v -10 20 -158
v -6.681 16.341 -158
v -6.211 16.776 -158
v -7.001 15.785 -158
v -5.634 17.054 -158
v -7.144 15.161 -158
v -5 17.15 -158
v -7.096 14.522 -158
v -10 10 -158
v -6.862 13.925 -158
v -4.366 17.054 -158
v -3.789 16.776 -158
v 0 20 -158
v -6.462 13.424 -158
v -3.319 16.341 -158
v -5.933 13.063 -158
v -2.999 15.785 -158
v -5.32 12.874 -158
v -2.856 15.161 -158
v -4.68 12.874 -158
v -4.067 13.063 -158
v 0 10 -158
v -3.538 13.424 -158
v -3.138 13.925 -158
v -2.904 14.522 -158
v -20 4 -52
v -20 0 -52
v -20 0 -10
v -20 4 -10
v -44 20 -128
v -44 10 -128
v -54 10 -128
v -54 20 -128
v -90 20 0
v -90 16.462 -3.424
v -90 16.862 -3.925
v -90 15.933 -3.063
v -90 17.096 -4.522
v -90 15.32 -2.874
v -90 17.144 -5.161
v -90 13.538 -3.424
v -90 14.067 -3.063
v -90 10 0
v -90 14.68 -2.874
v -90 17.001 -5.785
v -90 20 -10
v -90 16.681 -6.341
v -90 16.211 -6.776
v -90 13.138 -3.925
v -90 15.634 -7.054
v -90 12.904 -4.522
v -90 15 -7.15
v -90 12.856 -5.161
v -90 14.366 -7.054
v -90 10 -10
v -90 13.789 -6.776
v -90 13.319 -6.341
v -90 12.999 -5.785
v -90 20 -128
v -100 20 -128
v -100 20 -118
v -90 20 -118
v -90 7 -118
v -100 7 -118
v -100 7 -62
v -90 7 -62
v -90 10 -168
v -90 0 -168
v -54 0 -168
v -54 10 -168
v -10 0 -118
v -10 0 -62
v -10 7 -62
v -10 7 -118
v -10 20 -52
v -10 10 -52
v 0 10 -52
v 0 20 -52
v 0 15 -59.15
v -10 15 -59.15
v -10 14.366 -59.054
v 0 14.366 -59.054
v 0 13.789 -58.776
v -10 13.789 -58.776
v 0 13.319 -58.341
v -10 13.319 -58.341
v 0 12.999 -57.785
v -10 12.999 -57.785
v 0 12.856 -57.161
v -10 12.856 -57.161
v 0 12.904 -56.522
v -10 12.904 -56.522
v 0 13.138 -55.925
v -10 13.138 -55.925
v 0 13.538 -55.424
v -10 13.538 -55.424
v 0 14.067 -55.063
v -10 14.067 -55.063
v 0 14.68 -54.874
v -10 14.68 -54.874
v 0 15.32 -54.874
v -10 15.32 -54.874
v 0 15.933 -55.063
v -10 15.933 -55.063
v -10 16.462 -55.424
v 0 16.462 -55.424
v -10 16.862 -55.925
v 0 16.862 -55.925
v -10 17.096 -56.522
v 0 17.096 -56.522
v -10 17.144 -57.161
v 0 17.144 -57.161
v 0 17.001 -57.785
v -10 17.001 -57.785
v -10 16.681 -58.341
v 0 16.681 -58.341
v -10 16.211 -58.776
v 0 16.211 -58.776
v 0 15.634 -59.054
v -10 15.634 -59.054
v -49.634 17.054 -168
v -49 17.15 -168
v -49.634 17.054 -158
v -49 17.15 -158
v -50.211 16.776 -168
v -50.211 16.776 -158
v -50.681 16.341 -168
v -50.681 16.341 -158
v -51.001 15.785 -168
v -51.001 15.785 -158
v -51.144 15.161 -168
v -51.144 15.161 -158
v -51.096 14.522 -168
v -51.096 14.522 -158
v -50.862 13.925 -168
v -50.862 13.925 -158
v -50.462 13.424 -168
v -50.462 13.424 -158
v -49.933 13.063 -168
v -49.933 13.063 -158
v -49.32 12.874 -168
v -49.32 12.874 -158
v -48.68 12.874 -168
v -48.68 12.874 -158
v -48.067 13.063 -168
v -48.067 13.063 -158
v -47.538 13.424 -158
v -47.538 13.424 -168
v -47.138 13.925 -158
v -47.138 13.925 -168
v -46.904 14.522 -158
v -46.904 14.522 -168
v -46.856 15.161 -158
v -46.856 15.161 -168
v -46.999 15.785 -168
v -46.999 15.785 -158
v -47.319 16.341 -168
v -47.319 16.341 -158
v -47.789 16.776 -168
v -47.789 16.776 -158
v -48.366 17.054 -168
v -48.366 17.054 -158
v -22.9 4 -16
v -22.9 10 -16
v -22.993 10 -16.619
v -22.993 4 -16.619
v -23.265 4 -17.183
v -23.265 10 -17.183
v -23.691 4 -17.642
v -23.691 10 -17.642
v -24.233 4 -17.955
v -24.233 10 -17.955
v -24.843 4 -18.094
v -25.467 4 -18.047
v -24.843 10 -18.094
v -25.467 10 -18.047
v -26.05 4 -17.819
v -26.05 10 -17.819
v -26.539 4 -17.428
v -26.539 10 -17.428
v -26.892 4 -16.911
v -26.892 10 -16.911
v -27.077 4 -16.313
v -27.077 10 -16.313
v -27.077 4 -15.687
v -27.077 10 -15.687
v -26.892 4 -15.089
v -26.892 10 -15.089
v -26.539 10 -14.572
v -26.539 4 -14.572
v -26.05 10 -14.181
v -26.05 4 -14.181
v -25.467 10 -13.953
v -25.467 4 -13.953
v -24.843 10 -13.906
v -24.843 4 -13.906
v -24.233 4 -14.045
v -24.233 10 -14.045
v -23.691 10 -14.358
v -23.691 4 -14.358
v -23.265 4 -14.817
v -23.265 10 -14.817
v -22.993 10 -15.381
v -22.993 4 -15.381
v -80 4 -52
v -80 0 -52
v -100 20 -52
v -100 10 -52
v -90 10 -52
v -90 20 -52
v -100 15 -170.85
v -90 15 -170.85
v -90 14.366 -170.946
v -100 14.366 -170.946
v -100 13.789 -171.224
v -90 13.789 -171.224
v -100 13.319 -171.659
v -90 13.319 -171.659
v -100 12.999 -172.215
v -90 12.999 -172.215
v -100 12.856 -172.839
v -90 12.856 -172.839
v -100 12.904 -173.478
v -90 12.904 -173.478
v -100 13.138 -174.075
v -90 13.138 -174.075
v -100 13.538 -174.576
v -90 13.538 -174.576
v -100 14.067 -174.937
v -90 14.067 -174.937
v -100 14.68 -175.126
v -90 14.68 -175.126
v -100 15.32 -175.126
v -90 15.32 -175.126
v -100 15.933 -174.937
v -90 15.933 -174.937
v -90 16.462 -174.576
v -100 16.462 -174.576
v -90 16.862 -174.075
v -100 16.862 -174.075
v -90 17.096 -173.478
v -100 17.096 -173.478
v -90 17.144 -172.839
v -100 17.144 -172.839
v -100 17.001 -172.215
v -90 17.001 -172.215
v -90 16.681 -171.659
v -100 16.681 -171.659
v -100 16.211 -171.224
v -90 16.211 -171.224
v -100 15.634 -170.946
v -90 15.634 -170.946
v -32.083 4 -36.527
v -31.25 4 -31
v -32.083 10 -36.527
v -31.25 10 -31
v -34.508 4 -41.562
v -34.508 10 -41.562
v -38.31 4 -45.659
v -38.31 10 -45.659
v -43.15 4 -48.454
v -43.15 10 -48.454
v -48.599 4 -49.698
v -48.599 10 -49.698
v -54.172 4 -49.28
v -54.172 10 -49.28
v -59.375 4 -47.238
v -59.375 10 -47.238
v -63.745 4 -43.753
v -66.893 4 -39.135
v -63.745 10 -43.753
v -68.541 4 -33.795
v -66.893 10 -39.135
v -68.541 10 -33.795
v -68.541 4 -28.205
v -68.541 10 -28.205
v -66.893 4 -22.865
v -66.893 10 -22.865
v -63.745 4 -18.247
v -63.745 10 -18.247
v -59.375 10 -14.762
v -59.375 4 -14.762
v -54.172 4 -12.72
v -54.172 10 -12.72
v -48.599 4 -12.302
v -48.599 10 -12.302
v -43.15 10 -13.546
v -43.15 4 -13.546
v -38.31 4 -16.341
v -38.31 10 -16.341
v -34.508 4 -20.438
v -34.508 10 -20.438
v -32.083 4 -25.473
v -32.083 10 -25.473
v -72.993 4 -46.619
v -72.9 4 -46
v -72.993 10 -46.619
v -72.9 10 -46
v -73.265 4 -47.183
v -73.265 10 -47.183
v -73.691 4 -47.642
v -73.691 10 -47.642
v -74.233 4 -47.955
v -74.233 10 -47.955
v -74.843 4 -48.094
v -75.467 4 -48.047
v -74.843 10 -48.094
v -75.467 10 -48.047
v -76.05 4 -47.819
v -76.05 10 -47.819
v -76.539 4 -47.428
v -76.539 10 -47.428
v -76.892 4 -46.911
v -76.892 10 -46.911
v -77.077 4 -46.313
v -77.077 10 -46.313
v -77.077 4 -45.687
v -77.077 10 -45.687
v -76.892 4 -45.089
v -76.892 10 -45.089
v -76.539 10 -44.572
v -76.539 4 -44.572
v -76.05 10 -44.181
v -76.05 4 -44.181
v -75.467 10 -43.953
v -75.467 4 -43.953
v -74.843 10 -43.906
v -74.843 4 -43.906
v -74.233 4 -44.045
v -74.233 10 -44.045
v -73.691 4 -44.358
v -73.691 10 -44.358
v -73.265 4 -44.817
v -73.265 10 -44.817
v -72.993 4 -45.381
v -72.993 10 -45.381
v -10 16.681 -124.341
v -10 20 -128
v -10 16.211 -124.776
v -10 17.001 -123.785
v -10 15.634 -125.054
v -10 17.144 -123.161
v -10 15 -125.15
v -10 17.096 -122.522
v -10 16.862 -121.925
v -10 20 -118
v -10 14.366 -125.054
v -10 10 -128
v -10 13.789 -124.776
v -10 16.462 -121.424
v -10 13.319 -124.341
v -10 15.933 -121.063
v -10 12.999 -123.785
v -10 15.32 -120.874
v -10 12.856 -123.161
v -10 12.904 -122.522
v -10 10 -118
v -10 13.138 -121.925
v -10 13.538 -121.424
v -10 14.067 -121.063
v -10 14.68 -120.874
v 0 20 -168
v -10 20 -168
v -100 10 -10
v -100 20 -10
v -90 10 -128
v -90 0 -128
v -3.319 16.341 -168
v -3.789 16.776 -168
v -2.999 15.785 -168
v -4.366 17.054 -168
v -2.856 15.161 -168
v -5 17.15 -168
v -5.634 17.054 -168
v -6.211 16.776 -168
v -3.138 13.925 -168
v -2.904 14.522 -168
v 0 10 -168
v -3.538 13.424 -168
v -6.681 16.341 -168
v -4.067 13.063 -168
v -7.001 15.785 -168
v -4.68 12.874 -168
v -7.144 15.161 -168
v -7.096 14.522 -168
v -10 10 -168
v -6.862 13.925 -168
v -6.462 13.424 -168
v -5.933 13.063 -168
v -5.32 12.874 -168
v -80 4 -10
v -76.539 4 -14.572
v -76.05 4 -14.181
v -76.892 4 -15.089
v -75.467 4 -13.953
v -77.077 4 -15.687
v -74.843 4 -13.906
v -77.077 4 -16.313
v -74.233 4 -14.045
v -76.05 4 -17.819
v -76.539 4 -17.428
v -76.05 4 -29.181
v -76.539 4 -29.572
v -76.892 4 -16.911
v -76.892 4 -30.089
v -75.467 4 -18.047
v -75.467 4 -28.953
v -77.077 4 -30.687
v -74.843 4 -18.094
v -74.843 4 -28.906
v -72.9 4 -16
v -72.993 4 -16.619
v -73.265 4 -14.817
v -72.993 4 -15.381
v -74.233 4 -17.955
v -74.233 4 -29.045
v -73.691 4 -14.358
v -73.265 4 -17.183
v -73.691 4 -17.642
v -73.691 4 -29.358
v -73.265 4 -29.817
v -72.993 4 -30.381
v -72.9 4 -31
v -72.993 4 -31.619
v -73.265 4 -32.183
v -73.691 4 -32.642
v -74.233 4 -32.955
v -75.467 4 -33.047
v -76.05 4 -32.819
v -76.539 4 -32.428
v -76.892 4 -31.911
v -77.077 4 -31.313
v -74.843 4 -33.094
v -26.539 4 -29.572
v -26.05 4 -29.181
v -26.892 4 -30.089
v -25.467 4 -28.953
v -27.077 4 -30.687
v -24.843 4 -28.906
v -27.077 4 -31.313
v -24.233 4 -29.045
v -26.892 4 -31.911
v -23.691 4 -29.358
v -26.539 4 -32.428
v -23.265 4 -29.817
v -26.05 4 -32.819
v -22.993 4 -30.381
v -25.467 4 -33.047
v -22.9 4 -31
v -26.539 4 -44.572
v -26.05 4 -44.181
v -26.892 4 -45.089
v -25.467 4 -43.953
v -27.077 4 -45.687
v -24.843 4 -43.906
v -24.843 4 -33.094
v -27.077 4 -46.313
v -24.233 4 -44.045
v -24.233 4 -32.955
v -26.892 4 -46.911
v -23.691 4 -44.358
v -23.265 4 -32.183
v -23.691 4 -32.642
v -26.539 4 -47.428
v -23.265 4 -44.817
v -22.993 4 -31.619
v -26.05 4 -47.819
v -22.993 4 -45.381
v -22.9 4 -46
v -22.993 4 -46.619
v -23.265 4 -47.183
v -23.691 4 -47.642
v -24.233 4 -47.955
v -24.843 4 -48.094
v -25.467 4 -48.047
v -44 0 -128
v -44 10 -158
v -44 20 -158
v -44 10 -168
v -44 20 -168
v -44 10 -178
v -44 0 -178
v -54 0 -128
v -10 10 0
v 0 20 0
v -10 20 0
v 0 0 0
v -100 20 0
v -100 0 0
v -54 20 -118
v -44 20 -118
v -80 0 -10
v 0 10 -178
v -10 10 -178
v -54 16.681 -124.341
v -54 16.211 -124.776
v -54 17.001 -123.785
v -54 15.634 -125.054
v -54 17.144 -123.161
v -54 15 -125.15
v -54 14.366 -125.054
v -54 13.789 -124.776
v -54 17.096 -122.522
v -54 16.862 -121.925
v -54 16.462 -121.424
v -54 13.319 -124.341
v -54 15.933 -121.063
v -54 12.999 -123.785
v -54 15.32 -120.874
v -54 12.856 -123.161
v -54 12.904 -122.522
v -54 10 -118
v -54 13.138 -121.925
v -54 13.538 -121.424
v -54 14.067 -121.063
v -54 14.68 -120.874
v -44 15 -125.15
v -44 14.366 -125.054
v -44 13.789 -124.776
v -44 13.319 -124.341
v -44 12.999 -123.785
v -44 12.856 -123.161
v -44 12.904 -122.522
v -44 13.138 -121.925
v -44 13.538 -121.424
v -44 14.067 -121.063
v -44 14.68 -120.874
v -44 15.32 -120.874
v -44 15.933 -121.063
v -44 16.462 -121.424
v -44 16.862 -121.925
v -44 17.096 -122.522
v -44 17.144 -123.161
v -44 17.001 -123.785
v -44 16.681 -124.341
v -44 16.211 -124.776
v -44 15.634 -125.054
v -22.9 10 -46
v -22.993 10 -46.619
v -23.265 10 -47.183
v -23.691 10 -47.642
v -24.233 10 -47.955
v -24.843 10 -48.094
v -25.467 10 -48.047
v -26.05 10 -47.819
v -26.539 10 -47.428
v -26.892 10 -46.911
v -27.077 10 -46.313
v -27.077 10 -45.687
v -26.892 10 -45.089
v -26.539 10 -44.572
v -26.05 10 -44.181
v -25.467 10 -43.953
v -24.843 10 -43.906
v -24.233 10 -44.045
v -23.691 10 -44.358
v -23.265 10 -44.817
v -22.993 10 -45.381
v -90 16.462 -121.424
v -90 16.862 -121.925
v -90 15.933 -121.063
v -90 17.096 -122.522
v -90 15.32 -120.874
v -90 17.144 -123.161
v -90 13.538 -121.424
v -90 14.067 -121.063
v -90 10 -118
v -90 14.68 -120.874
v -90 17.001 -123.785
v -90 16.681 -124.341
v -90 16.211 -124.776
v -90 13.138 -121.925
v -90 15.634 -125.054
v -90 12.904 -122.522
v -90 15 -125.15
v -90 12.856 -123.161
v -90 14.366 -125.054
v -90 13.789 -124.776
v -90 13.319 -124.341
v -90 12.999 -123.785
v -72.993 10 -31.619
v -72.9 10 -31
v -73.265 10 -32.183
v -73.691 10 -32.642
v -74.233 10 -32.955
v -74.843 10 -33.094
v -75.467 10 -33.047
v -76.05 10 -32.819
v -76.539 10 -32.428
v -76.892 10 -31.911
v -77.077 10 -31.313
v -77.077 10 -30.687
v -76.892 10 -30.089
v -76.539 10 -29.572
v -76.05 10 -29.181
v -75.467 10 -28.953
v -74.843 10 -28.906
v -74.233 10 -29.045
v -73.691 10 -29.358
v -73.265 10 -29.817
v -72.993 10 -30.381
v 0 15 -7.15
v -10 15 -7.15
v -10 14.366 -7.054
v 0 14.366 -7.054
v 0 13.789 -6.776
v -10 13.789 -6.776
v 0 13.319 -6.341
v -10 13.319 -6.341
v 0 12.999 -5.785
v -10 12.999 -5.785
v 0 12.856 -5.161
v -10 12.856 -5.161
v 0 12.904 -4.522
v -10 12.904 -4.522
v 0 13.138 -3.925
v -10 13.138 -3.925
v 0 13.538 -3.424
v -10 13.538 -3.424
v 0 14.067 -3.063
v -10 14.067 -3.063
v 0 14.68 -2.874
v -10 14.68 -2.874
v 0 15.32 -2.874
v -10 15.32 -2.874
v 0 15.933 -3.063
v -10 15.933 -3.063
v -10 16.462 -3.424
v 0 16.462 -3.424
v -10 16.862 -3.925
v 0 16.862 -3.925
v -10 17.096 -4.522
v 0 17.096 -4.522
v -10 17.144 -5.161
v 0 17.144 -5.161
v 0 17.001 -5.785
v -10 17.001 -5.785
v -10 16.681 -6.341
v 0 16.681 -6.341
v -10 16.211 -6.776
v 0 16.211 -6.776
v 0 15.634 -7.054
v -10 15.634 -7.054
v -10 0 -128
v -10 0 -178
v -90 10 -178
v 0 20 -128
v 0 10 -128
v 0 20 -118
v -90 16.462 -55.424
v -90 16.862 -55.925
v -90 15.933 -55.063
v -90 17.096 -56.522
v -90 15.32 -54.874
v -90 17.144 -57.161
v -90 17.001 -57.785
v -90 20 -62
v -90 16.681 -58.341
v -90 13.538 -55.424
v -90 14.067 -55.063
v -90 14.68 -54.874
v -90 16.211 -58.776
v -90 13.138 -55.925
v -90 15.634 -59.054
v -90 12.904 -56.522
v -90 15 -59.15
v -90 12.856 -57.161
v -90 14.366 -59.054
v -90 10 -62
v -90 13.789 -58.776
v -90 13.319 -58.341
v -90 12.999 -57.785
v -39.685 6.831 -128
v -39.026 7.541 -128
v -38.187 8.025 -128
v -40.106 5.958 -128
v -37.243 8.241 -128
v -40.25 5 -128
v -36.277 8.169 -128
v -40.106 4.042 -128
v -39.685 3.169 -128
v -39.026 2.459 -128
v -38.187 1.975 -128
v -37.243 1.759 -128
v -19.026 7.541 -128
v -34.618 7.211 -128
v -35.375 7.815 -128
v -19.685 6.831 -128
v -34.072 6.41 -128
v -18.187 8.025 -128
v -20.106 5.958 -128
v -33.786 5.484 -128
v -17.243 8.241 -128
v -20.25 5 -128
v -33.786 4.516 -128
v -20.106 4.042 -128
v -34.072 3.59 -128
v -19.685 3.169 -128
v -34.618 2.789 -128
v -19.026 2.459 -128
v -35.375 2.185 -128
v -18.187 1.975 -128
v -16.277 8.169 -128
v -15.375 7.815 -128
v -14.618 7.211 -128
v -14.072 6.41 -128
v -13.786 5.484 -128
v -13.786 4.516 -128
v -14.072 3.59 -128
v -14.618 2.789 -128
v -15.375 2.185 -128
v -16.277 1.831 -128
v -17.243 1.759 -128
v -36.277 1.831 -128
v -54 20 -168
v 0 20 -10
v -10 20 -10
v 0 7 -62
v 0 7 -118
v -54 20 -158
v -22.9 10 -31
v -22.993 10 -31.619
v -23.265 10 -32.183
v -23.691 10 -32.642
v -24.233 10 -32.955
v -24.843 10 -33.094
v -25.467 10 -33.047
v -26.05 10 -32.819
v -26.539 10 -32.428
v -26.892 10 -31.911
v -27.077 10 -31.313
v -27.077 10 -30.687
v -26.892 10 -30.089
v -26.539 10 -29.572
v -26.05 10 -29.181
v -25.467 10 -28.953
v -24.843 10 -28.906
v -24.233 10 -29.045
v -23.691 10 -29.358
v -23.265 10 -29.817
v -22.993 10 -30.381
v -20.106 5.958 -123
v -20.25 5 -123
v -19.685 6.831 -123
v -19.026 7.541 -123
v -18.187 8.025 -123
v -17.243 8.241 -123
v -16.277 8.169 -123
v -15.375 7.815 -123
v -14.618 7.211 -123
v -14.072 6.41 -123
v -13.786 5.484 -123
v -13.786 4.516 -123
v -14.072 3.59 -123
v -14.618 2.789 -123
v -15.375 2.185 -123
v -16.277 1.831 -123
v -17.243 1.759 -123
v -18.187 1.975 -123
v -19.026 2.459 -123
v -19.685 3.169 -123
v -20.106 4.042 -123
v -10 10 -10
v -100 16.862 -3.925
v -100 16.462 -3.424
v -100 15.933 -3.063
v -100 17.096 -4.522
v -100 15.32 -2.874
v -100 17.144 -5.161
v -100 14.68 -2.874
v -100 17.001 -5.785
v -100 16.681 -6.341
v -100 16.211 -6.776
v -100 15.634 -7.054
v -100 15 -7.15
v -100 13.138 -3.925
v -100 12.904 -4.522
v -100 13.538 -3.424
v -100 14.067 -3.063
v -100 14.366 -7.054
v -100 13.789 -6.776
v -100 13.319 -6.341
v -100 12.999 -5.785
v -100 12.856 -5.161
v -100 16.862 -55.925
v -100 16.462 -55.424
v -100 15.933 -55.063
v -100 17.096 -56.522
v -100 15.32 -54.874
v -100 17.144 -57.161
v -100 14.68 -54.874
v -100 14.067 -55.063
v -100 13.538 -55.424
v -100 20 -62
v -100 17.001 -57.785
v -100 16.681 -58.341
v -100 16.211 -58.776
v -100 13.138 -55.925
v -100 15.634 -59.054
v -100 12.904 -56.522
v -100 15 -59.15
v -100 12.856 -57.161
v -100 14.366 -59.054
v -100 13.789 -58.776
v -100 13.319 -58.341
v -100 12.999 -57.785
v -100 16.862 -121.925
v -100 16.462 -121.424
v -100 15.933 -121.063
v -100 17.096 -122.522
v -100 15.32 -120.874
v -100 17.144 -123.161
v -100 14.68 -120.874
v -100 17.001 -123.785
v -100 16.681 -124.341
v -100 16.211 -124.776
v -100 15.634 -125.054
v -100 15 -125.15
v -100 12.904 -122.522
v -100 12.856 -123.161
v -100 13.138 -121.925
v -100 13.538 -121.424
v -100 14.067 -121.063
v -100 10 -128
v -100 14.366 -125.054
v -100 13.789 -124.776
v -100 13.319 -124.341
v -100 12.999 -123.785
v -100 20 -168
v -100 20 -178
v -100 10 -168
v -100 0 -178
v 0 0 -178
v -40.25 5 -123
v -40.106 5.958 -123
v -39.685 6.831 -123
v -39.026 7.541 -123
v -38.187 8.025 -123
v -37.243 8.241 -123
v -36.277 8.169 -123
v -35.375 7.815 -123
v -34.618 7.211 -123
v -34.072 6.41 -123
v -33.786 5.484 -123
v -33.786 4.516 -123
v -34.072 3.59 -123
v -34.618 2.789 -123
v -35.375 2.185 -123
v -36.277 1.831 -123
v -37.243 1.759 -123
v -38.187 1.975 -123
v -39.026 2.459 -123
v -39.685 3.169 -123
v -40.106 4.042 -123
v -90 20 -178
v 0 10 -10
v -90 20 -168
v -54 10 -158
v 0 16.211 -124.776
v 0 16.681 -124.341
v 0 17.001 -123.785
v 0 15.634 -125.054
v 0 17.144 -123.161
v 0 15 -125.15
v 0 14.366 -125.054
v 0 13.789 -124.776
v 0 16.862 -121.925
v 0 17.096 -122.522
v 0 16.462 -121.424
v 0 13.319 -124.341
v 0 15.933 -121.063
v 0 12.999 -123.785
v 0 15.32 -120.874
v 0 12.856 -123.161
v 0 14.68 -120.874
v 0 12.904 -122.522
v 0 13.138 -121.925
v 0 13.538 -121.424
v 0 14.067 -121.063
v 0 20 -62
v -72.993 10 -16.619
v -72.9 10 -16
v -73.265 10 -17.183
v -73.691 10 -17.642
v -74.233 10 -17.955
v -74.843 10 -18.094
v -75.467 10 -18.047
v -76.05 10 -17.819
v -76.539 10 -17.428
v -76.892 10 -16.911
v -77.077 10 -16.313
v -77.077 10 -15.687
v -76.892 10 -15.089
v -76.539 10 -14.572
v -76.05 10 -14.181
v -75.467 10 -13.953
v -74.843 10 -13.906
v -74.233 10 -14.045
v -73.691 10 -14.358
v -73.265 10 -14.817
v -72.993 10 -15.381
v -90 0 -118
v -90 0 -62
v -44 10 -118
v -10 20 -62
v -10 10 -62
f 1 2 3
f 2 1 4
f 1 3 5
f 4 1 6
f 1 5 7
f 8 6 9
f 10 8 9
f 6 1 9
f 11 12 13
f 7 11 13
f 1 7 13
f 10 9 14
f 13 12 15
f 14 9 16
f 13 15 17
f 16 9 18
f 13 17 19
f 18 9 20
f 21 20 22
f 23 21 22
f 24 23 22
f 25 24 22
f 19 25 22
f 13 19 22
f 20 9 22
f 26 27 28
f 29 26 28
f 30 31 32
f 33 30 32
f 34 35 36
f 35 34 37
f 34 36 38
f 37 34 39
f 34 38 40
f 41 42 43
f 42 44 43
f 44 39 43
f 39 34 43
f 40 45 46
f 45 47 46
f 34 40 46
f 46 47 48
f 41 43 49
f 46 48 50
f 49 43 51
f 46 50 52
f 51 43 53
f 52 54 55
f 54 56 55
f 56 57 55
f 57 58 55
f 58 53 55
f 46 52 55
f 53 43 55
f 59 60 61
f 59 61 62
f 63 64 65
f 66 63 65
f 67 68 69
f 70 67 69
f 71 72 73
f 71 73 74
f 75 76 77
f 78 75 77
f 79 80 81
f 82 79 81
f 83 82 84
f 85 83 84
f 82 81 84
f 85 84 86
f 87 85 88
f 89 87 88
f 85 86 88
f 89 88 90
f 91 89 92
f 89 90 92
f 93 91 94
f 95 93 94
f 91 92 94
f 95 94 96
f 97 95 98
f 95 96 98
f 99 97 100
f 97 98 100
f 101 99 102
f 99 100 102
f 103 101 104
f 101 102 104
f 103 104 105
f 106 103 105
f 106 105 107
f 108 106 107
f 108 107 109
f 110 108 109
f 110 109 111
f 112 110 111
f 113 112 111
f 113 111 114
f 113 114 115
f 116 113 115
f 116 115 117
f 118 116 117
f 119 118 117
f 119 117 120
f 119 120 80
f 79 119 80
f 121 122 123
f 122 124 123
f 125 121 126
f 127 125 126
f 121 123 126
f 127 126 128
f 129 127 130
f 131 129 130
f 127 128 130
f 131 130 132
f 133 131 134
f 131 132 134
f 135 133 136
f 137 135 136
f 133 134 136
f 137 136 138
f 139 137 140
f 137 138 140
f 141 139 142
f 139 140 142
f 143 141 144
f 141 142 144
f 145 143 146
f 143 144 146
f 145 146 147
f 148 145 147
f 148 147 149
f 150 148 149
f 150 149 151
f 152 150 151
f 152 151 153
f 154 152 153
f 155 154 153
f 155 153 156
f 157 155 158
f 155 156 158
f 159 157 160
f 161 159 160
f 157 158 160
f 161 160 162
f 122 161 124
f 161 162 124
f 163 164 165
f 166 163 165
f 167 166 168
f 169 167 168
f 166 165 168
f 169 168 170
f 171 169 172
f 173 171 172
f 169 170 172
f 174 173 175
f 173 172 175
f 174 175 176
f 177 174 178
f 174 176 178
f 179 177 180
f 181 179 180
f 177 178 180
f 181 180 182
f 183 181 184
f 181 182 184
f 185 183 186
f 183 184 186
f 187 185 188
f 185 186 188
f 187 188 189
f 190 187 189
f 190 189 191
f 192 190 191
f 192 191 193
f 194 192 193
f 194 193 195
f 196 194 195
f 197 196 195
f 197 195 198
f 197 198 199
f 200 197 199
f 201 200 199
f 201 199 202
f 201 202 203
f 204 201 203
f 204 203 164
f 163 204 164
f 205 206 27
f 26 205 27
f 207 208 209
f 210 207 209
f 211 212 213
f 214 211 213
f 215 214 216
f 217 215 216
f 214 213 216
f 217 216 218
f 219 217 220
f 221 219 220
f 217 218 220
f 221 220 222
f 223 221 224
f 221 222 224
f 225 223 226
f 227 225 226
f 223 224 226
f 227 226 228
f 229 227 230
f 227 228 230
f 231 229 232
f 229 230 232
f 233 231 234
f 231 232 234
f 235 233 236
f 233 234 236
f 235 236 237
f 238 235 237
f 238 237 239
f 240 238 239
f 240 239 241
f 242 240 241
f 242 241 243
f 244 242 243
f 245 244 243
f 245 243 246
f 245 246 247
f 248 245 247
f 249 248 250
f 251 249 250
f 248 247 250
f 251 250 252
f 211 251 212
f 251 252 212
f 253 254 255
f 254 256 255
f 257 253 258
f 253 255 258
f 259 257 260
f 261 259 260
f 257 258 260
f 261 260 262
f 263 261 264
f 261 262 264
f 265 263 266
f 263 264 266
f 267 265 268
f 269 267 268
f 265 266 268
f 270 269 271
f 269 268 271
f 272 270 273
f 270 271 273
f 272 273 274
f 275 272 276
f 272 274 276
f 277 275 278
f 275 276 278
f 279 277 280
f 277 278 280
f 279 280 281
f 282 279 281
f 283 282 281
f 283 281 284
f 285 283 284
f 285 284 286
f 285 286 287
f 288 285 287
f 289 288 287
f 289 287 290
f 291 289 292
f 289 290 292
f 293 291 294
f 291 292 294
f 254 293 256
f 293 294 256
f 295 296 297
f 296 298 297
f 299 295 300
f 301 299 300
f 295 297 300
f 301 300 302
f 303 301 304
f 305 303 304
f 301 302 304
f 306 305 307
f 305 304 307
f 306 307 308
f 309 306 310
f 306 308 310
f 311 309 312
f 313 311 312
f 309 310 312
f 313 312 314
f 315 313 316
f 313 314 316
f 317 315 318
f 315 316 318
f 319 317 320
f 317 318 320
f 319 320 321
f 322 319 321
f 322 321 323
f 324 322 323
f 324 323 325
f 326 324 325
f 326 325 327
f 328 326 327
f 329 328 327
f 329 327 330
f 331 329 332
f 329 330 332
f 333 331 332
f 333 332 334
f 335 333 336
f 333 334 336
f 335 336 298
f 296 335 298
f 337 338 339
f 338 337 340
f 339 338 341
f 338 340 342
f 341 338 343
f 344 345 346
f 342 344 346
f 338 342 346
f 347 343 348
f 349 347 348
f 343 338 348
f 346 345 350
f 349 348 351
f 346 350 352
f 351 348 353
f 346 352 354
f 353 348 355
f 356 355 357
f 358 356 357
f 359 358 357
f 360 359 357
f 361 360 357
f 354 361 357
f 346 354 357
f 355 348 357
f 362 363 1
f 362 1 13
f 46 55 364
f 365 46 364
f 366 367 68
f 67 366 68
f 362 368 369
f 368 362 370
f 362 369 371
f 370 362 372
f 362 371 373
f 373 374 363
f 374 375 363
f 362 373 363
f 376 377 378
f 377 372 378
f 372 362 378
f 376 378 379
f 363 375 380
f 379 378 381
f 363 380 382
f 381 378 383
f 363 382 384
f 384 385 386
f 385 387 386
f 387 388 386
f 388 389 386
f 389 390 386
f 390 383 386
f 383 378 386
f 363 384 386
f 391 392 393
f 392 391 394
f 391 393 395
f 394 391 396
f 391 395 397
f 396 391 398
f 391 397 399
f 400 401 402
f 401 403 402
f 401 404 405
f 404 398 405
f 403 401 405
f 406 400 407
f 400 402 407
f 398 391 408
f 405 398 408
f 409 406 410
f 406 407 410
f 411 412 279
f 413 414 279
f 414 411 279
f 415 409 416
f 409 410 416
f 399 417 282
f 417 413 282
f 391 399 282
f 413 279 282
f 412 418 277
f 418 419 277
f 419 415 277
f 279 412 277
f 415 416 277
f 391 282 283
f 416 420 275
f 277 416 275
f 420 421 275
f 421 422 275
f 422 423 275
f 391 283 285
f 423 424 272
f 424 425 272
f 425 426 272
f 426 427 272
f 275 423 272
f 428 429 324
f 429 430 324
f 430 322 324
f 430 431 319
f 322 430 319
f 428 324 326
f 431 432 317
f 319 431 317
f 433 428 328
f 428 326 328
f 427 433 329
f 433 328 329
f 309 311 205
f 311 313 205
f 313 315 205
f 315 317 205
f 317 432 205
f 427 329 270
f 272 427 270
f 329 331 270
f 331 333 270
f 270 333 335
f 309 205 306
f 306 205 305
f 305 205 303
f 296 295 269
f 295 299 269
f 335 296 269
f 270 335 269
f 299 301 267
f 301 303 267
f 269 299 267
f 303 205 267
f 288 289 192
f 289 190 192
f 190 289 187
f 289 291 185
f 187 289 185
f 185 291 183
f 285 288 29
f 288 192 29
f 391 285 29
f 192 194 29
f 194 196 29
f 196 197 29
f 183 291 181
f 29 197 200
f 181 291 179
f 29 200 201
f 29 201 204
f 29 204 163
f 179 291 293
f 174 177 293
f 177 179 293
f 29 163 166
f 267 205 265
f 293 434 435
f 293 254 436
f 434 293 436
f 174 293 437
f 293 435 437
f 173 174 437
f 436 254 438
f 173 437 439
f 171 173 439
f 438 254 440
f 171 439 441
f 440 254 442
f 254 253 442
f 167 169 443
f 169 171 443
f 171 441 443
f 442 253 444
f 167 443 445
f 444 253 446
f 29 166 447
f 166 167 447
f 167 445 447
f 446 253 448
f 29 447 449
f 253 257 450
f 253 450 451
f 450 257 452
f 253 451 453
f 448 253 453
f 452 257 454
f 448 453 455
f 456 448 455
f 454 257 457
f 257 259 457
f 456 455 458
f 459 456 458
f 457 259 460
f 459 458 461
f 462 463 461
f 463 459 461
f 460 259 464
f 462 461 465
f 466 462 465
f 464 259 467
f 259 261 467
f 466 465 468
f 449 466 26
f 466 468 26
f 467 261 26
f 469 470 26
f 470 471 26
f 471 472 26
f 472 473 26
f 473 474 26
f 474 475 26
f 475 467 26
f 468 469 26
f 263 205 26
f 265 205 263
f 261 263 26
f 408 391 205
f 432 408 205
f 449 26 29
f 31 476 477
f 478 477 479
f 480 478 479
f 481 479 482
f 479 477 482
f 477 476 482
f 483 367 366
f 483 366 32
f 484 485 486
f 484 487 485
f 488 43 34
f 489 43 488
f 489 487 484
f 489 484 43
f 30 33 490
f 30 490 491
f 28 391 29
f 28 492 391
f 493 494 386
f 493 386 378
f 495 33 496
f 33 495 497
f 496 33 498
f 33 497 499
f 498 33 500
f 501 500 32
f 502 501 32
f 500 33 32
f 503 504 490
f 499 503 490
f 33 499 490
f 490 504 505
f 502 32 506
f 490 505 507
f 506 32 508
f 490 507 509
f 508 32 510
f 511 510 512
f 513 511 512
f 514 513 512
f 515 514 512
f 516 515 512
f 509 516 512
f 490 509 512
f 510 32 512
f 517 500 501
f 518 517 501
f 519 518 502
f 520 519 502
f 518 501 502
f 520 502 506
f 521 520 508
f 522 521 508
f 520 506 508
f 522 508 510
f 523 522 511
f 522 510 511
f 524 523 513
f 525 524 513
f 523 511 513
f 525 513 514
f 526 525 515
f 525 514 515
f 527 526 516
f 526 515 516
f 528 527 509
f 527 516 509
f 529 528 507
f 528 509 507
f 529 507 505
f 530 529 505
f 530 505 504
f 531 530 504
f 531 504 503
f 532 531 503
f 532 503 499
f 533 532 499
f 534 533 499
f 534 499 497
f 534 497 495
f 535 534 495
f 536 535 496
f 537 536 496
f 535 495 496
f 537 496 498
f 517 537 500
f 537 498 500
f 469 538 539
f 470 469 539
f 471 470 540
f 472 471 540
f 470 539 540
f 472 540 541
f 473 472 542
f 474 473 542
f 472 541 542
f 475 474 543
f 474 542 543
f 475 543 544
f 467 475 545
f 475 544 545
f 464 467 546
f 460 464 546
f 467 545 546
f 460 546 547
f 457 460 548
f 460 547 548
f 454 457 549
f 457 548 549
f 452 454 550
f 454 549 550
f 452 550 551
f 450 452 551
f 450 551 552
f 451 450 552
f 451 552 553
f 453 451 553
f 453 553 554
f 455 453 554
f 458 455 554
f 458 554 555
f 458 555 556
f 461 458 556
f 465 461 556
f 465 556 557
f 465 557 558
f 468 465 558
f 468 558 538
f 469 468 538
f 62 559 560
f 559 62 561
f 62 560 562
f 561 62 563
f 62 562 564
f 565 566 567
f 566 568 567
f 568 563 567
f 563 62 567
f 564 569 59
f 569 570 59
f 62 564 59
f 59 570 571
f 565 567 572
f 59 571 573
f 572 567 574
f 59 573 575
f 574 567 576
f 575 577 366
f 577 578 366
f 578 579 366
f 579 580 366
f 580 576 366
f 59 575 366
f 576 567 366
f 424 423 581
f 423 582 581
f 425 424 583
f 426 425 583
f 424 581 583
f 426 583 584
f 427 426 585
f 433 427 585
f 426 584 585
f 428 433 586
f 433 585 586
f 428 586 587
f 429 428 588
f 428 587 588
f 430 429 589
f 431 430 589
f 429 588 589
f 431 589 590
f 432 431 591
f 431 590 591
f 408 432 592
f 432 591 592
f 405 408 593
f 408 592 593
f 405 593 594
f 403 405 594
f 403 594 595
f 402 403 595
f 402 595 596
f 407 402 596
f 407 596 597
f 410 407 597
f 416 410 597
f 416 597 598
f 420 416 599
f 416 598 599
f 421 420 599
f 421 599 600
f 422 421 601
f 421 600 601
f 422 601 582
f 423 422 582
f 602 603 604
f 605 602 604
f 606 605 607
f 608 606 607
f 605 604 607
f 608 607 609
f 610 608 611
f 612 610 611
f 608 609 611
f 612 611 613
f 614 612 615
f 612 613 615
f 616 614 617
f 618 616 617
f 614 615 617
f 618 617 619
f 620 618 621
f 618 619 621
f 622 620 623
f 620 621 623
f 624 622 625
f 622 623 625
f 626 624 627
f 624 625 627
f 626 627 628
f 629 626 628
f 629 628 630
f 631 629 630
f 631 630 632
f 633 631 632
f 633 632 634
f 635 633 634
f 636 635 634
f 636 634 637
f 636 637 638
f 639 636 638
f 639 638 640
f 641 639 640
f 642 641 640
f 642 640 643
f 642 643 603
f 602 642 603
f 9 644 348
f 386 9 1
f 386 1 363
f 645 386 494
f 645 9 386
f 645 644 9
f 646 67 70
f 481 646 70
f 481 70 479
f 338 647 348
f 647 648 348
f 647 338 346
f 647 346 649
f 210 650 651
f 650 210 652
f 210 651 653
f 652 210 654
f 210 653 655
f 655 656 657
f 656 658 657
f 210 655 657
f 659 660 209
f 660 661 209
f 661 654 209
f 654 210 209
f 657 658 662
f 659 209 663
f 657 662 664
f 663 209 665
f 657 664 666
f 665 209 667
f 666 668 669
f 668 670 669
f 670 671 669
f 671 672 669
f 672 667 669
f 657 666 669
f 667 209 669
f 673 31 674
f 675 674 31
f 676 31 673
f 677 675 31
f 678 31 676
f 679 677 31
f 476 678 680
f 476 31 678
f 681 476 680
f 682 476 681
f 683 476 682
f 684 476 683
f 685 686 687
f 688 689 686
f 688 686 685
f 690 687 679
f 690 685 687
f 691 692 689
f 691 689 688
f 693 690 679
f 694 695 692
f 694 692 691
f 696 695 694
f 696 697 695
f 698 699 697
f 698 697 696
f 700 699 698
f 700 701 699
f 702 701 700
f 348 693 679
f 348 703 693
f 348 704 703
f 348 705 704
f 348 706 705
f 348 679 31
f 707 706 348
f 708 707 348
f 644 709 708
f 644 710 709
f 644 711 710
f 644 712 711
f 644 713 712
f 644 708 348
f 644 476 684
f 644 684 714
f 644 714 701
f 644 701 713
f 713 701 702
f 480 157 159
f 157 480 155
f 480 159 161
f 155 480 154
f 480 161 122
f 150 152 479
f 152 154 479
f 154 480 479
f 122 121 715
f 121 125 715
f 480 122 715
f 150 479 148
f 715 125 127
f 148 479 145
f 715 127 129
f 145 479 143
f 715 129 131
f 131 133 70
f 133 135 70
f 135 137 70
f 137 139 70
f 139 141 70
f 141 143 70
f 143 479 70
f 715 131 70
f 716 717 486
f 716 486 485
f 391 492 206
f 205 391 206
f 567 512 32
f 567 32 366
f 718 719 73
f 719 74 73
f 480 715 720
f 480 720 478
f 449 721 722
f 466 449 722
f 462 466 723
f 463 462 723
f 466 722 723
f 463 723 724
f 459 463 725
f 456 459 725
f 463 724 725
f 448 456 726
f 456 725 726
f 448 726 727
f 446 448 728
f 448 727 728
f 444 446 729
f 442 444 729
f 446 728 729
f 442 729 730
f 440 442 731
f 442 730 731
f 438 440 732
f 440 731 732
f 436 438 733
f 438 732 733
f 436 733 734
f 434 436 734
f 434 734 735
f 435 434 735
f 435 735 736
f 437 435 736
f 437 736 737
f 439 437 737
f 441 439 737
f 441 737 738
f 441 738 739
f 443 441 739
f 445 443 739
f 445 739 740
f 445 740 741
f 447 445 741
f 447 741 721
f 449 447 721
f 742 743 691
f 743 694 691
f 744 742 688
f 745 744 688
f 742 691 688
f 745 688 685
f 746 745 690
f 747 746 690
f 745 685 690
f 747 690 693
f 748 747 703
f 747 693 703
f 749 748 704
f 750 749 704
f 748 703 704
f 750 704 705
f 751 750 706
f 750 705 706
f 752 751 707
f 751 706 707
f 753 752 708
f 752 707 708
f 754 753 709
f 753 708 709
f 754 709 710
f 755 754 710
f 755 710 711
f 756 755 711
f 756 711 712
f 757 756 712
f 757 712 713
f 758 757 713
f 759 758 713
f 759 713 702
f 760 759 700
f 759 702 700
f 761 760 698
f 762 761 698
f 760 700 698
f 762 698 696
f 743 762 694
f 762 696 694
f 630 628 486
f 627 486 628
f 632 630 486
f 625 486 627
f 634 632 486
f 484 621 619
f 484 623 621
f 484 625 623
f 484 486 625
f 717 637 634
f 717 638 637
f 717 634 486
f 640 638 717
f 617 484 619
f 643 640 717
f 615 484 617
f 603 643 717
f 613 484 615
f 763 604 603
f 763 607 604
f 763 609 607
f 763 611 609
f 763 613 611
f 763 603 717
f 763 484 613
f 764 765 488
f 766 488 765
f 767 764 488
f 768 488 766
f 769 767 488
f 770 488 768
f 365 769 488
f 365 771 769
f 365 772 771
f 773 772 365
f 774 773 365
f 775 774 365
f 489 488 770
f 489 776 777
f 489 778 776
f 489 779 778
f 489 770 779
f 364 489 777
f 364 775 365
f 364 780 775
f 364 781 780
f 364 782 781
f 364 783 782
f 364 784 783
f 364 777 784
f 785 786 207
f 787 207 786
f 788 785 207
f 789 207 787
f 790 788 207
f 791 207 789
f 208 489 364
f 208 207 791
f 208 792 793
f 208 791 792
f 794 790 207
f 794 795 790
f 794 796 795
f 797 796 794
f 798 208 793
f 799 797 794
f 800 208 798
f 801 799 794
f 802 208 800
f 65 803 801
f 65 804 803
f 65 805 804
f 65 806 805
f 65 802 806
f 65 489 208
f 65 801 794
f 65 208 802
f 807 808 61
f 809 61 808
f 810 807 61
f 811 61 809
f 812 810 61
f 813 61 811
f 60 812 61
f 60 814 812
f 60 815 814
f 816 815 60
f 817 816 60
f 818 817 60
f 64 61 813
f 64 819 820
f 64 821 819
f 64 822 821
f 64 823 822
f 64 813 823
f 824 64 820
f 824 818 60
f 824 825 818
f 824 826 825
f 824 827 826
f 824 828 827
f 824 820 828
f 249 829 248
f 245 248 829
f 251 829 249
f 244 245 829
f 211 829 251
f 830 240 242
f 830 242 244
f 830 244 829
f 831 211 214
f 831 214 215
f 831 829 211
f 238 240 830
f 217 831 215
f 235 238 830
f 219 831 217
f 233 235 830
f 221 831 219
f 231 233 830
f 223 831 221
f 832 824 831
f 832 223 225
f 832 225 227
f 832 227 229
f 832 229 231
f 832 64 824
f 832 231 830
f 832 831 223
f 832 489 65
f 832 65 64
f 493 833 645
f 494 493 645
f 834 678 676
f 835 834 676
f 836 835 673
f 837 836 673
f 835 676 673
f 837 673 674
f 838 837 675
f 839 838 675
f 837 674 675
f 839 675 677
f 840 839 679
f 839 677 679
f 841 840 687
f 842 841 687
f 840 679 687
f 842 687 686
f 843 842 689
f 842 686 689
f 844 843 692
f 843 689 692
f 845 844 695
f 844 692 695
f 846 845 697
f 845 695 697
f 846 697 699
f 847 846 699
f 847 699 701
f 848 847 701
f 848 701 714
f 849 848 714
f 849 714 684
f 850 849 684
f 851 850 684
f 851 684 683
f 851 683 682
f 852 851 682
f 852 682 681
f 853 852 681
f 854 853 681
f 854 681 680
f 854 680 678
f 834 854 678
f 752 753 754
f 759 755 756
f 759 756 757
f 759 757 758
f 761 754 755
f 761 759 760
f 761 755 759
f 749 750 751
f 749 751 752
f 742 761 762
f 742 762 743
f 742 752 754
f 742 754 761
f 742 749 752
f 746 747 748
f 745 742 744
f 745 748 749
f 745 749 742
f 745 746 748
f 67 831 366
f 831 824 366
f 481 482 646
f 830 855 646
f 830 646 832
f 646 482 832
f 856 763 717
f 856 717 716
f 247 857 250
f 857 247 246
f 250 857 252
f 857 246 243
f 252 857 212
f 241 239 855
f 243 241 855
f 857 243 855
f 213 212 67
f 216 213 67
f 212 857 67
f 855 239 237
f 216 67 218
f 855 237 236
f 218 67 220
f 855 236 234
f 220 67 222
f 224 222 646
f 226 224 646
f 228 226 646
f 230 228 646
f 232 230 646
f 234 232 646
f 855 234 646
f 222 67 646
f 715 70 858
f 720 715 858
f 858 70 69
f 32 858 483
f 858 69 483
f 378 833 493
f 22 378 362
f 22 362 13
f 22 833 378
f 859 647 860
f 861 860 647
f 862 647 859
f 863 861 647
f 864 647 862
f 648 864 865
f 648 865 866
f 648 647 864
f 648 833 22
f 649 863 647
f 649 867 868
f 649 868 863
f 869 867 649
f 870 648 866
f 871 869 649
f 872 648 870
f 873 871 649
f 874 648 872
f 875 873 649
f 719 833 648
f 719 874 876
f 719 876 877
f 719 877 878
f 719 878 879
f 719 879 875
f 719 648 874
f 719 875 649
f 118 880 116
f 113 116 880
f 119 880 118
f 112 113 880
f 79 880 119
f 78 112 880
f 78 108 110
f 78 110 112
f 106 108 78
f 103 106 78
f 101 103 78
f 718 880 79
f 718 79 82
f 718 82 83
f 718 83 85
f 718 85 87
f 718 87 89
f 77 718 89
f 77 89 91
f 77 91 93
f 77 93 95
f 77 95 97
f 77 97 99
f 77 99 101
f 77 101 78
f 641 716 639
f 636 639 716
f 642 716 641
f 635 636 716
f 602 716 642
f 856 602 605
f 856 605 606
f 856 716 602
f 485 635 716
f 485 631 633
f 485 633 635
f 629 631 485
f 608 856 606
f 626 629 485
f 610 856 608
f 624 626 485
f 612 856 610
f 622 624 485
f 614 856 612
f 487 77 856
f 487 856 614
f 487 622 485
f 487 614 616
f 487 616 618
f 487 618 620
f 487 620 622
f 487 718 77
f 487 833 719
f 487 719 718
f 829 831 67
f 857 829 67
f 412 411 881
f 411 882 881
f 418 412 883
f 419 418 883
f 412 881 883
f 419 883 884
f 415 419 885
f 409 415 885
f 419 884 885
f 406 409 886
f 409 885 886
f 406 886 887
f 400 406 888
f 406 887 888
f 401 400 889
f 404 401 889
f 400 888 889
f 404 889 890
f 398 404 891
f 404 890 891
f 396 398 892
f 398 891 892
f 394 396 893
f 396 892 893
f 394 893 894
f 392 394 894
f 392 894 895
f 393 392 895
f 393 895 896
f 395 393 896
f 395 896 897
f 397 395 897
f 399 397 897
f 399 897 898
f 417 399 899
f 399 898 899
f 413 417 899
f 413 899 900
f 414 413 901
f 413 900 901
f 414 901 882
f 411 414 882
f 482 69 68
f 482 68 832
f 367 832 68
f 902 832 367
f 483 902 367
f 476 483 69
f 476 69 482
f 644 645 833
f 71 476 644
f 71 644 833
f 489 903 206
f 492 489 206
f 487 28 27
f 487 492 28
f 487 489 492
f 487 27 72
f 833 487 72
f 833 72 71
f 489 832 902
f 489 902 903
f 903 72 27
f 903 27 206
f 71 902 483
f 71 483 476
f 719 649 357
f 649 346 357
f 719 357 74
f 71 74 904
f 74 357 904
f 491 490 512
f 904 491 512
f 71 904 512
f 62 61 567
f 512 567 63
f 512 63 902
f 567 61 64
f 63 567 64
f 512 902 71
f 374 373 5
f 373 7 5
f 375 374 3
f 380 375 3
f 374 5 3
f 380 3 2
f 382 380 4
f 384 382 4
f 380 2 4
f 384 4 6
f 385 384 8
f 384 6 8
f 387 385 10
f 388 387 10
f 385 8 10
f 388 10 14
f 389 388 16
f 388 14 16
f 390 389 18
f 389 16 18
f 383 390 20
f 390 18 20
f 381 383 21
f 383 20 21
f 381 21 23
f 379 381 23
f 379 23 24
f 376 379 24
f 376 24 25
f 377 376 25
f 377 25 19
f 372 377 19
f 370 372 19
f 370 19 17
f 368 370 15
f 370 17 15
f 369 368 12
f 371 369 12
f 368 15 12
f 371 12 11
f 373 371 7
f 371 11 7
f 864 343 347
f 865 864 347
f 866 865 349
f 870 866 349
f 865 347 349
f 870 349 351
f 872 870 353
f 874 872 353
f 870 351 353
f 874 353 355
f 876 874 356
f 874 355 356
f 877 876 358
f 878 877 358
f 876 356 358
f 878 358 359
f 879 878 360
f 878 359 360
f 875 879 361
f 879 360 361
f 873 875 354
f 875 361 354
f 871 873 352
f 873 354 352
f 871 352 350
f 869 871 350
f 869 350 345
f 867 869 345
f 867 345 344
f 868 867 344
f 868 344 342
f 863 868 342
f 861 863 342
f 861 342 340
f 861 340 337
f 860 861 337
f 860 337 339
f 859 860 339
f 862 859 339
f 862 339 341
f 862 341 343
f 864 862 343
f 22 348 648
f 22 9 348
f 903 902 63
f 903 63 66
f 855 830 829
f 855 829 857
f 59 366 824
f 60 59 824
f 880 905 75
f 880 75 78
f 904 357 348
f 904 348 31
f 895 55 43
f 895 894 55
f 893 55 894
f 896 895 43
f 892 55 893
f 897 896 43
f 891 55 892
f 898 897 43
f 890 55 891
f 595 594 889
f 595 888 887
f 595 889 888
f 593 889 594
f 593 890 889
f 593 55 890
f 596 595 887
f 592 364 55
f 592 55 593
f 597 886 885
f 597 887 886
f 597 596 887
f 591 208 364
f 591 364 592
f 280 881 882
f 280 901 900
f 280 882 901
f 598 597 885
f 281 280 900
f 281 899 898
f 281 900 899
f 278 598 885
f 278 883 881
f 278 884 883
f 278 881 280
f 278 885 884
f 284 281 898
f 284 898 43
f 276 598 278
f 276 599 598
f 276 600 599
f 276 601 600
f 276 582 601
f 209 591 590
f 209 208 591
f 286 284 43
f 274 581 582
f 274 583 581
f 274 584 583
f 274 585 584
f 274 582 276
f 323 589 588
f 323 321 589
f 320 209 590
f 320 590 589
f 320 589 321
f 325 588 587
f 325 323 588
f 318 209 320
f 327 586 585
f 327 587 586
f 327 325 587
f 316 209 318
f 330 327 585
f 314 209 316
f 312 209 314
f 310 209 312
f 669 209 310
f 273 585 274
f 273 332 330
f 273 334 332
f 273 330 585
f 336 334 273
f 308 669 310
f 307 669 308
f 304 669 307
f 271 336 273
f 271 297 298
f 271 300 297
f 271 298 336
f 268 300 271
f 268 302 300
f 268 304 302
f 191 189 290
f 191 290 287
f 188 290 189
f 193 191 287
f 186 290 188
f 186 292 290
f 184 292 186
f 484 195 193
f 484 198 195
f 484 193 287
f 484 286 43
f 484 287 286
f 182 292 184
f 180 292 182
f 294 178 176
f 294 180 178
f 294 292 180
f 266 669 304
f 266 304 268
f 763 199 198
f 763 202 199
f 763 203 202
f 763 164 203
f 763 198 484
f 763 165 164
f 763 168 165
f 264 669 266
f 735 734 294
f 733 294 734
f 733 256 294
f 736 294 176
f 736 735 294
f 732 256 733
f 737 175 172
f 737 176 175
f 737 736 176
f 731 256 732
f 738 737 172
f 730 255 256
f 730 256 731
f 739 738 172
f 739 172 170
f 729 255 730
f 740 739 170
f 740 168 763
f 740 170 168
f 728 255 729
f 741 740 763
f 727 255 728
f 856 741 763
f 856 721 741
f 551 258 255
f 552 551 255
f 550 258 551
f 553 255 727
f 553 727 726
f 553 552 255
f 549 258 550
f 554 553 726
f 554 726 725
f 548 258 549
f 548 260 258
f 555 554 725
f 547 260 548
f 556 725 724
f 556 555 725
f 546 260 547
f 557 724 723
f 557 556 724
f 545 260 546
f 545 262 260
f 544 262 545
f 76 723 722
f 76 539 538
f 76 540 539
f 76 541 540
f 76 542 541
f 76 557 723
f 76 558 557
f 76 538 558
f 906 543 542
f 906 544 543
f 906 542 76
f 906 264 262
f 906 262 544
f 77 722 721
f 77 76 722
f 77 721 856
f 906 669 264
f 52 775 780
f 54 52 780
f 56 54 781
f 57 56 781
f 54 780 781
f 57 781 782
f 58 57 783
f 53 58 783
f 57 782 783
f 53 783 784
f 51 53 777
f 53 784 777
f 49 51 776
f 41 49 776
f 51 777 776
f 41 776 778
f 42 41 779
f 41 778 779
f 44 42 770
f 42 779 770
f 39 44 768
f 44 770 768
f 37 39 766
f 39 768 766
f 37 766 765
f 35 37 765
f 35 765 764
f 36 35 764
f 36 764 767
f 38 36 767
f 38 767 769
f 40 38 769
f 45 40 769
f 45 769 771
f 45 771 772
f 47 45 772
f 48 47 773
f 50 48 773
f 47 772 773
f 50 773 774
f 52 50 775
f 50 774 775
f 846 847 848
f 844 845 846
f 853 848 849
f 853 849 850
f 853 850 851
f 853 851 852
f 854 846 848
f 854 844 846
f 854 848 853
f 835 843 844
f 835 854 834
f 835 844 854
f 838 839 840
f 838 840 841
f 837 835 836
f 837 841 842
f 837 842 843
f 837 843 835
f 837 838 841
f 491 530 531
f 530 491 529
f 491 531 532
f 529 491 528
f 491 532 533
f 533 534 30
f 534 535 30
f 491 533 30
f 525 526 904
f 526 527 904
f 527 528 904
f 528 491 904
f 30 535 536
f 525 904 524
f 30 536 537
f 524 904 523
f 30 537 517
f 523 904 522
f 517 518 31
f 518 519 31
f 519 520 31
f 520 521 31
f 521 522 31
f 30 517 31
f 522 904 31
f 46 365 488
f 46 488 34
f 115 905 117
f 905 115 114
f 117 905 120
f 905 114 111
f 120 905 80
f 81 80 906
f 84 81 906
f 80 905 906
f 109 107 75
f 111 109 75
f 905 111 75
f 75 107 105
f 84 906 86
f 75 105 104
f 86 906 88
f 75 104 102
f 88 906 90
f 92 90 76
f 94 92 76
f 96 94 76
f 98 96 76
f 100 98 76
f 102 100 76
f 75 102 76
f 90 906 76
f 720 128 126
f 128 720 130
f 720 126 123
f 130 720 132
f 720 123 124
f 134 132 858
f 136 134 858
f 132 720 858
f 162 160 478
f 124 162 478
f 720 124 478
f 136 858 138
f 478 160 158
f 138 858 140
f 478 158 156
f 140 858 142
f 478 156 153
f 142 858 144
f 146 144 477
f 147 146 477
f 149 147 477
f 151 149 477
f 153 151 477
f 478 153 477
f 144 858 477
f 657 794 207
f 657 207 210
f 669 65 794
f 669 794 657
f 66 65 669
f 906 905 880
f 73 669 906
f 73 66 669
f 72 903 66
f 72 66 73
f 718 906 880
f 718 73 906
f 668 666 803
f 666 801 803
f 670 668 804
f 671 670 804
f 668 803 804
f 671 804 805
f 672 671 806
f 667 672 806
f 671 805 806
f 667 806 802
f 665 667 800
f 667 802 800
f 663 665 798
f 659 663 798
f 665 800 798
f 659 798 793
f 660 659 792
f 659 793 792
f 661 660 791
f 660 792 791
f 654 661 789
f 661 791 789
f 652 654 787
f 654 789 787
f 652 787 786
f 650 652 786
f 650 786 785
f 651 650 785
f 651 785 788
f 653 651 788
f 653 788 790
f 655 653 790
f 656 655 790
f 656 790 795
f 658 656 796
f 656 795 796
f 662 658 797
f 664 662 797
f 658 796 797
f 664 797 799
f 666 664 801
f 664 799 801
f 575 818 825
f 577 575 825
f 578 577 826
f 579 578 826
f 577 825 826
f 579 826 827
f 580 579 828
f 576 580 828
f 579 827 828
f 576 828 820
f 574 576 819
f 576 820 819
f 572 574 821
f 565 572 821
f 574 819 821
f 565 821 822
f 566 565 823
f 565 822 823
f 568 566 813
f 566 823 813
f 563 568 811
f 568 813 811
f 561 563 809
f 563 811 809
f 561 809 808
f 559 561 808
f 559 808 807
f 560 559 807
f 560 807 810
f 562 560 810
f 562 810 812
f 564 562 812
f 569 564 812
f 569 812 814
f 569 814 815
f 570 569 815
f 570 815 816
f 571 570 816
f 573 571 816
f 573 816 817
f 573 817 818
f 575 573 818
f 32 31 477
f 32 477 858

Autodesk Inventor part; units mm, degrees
ref_plane "YZ Plane" through (0, 0, 0) normal (1, 0, 0) x (0, 1, 0)
ref_plane "XZ Plane" through (0, 0, 0) normal (0, 1, 0) x (-1, 0, 0)
ref_plane "XY Plane" through (0, 0, 0) normal (0, 0, 1) x (1, 0, 0)
sketch "Sketch1" plane through (0, 0, 0) normal (0, 1, 0) x (-1, 0, 0)
  line L0 (0, 0) -> (100, 0)
  line L1 (100, 0) -> (100, -178)
  line L2 (0, -178) -> (0, 0)
  line L3 (90, -10) -> (10, -10)
  line L4 (90, -52) -> (10, -52)
  line L5 (90, -62) -> (10, -62)
  line L6 (90, -52) -> (90, -10)
  line L7 (10, -10) -> (10, -52)
  line L8 (90, -118) -> (10, -118)
  line L9 (90, -168) -> (90, -128)
  line L10 (90, -118) -> (90, -62)
  line L11 (10, -62) -> (10, -118)
  line L12 (10, -128) -> (10, -168)
  line L13 (100, -178) -> (90, -178)
  line L14 (10, -178) -> (0, -178)
  line L15 (90, -168) -> (90, -178)
  line L16 (10, -168) -> (44, -168)
  line L17 (54, -168) -> (54, -178)
  line L18 (54, -178) -> (10, -178)
  line L19 (54, -168) -> (54, -128)
  line L20 (44, -128) -> (44, -168)
  line L21 (90, -128) -> (54, -128)
  line L22 (44, -128) -> (10, -128)
  dimension "thickness" = 10
  dimension "d3" = 10
  dimension "d4" = 10
  dimension "d8" = 10
  dimension "motor" = 42
  dimension "d10" = 10
  dimension "d11" = 10
  dimension "d27" = 10
  dimension "batterywidth" = 56
  dimension "d31" = 80
  dimension "suspensionWidth" = 40
  dimension "d33" = 10
  dimension "d34" = 10
  dimension "d36" = 10
  dimension "d38" = 10
  dimension "d39" = 40
  dimension "d40" = 40
  dimension "d41" = 34
  dimension "d215" = 36
extrude "Extrusion2" add sketch "Sketch1" along normal blind 10
sketch "Sketch2" plane through (0, 10, 0) normal (0, 1, 0) x (1, 0, 0)
  line L0 (-100, 0) -> (-90, 0)
  line L1 (-90, 0) -> (-90, 10)
  line L2 (-90, 10) -> (-100, 10)
  line L3 (-100, 10) -> (-100, 0)
  line L4 (-10, 52) -> (-10, 10)
  line L5 (0, 0) -> (-10, 0)
  line L6 (-10, 0) -> (-10, 10)
  line L7 (-10, 10) -> (0, 10)
  line L8 (0, 10) -> (0, 0)
  line L9 (-100, 178) -> (-100, 0)
  line L10 (-100, 0) -> (0, 0)
  line L11 (-100, 52) -> (-90, 52)
  line L12 (-90, 52) -> (-90, 62)
  line L13 (-90, 62) -> (-100, 62)
  line L14 (-100, 62) -> (-100, 52)
  line L15 (-90, 52) -> (-10, 52)
  line L16 (-10, 52) -> (0, 52)
  line L17 (0, 52) -> (0, 62)
  line L18 (0, 62) -> (-10, 62)
  line L19 (-10, 62) -> (-10, 52)
  line L20 (-90, 10) -> (-90, 52)
  line L21 (-100, 118) -> (-90, 118)
  line L22 (-90, 118) -> (-90, 128)
  line L23 (-90, 128) -> (-100, 128)
  line L24 (-100, 128) -> (-100, 118)
  line L25 (-54, 128) -> (-90, 128)
  line L26 (-54, 118) -> (-44, 118)
  line L27 (-44, 118) -> (-44, 128)
  line L28 (-44, 128) -> (-54, 128)
  line L29 (-54, 128) -> (-54, 118)
  line L30 (-90, 118) -> (-10, 118)
  line L31 (0, 178) -> (-54, 178)
  line L32 (-10, 168) -> (0, 168)
  line L33 (0, 168) -> (0, 178)
  line L34 (0, 178) -> (-10, 178)
  line L35 (-10, 178) -> (-10, 168)
  line L36 (0, 0) -> (0, 178)
  line L37 (-10, 118) -> (0, 118)
  line L38 (0, 118) -> (0, 128)
  line L39 (0, 128) -> (-10, 128)
  line L40 (-10, 128) -> (-10, 118)
  line L41 (-10, 128) -> (-44, 128)
  line L42 (-54, 158) -> (-44, 158)
  line L43 (-44, 158) -> (-44, 168)
  line L44 (-44, 168) -> (-54, 168)
  line L45 (-54, 168) -> (-54, 158)
  line L46 (-44, 168) -> (-10, 168)
  line L47 (-44, 128) -> (-44, 168)
  line L48 (-100, 158) -> (-90, 158)
  line L49 (-90, 158) -> (-90, 168)
  line L50 (-90, 168) -> (-100, 168)
  line L51 (-100, 168) -> (-100, 158)
  line L52 (-90, 128) -> (-90, 178)
  dimension "d34" = 10
  dimension "d44" = 10
  dimension "d45" = 10
  dimension "d47" = 10
  dimension "d50" = 10
  dimension "d51" = 10
  dimension "d52" = 10
  dimension "d53" = 10
  dimension "d58" = 10
  dimension "d64" = 10
  dimension "d65" = 10
  dimension "d148" = 10
  dimension "d149" = 10
  dimension "d150" = 10
  dimension "d151" = 10
extrude "Extrusion3" add sketch "Sketch2" along normal blind 10 contours L3 L2 L1 L0 | L6 L7 L8 L5 | L9 L13 L12 L11 | L19 L18 L17 L16 | L9 L23 L22 L21 | L9 L50 L49 L48 | L29 L28 L27 L26 | L37 L40 L39 L36 | L32 L35 L31 L33 | L42 L45 L44 L43
sketch "Sketch6" plane through (0, 0, 0) normal (0, -1, 0) x (1, 0, 0)
  line L0 (-90, -10) -> (-80, -10)
  line L1 (-80, -10) -> (-80, -52)
  line L2 (-80, -52) -> (-90, -52)
  line L3 (-90, -52) -> (-90, -10)
  line L4 (-90, -52) -> (-90, -10)
  line L5 (-90, -10) -> (-10, -10)
  line L6 (-10, -52) -> (-90, -52)
  line L7 (-20, -10) -> (-10, -10)
  line L8 (-10, -10) -> (-10, -52)
  line L9 (-10, -52) -> (-20, -52)
  line L10 (-20, -52) -> (-20, -10)
  line L11 (-10, -10) -> (-10, -52)
  point P0 (0, 0)
  dimension "motorFixtureHeight" = 60
  dimension "d72" = 10
extrude "Extrusion5" add sketch "Sketch6" against normal blind 10 contours L0 L1 L2 L3 | L5 L8 L6 L10
sketch "Sketch7" plane through (0, 10, 0) normal (0, 1, 0) x (1, 0, 0)
  line L0 (-80, 10) -> (-20, 10)
  line L1 (-20, 10) -> (-20, 52)
  line L2 (-20, 52) -> (-80, 52)
  line L3 (-80, 52) -> (-80, 10)
  line L4 (-80, 10) -> (-80, 52)
  line L5 (-80, 52) -> (-20, 52)
  line L6 (-20, 52) -> (-20, 10)
  line L7 (-20, 10) -> (-80, 10)
  circle A0 centre (-50, 31) radius 18.75
  circle A1 centre (-75, 16) radius 2.1
  circle A2 centre (-25, 31) radius 2.1
  circle A3 centre (-75, 46) radius 2.1
  circle A4 centre (-25, 16) radius 2.1
  circle A5 centre (-25, 46) radius 2.1
  circle A6 centre (-75, 31) radius 2.1
  point P0 (0, 0)
  dimension "d75" = 37.5
  dimension "d77" = 21
  dimension "d78" = 30
  dimension "d79" = 4.2
  dimension "d80" = 4.2
  dimension "d82" = 4.2
  dimension "d83" = 4.2
  dimension "d84" = 4.2
  dimension "d85" = 4.2
  dimension "d86" = 25
  dimension "d87" = 0
  dimension "d88" = 25
  dimension "d89" = 15
  dimension "d90" = 25
  dimension "d91" = 15
  dimension "d92" = 15
  dimension "d93" = 25
  dimension "d94" = 25
  dimension "d95" = 0
  dimension "d96" = 25
  dimension "d97" = 15
extrude "Extrusion6" add sketch "Sketch7" against normal blind 6
hole "Hole2" at (0, 15, -173) direction (-1, 0, 0) diameter 4.3 end through all
hole "Hole3" at (0, 15, -123) direction (-1, 0, 0) diameter 4.3 end through all
hole "Hole4" at (0, 15, -57) direction (-1, 0, 0) diameter 4.3 end through all
hole "Hole5" at (0, 15, -5) direction (-1, 0, 0) diameter 4.3 end through all
sketch "Sketch8" plane through (-100, 0, -178) normal (-1, 0, 0) x (0, 0, 1)
  line L0 (116, 10) -> (60, 10)
  line L1 (60, 10) -> (60, 7)
  line L2 (60, 7) -> (116, 7)
  line L3 (116, 7) -> (116, 10)
  line L4 (116, 10) -> (60, 7) construction
  line L5 (60, 10) -> (116, 7) construction
  line L6 (60, 10) -> (116, 10)
  line L7 (60, 10) -> (60, 20)
  line L8 (116, 10) -> (116, 20)
  point P0 (178, 0)
  point P1 (88, 8.5)
  dimension "d145" = 3
extrude "Extrusion7" cut sketch "Sketch8" against normal up to surface (100 mm away)
hole "Hole6" at (-95, 15, -168) direction (0, 0, 1) diameter 4.3 depth 10 tip angle 118
hole "Hole7" at (-49, 15, -168) direction (0, 0, 1) diameter 4.3 depth 10 tip angle 118
sketch "Sketch10" plane through (0, 0, 0) normal (0, -1, 0) x (1, 0, 0)
  line L0 (-90, -168) -> (-54, -168)
  line L1 (-54, -168) -> (-54, -178)
  line L2 (-54, -178) -> (-90, -178)
  line L3 (-90, -178) -> (-90, -168)
  line L4 (-54, -128) -> (-54, -178)
  line L5 (-90, -178) -> (-90, -128)
  line L6 (-10, -168) -> (-44, -168)
  line L7 (-54, -178) -> (0, -178)
  point P0 (0, 0)
extrude "Extrusion9" add sketch "Sketch10" against normal blind 10
sketch "Sketch11" plane through (0, 0, 0) normal (0, -1, 0) x (1, 0, 0)
  line L0 (-44, -168) -> (-10, -168)
  line L1 (-10, -168) -> (-10, -178)
  line L2 (-10, -178) -> (-44, -178)
  line L3 (-44, -178) -> (-44, -168)
  line L4 (-10, -168) -> (-44, -168)
  line L5 (-100, -178) -> (0, -178)
  line L6 (-44, -168) -> (-44, -128)
  line L7 (-10, -128) -> (-10, -168)
  point P0 (0, 0)
extrude "Extrusion10" cut sketch "Sketch11" against normal blind 10
sketch "Sketch12" plane through (-10, 0, -128) normal (0, 0, -1) x (-1, 0, 0)
  circle A0 centre (27, 5) radius 3.25
  circle A1 centre (7, 5) radius 3.25
  line L0 (34, 0) -> (0, 0)
  line L1 (34, 10) -> (34, 0)
  line L2 (0, 0) -> (0, 20)
  point P0 (-10, 0)
  dimension "d182" = 6.5
  dimension "d183" = 6.5
  dimension "d184" = 5
  dimension "d185" = 7
  dimension "d186" = 7
  dimension "d187" = 5
extrude "Extrusion11" cut sketch "Sketch12" against normal blind 5
sketch "Sketch13" plane through (0, 20, 0) normal (0, 1, 0) x (1, 0, 0)
  line L0 (-100, 158) -> (-90, 158)
  line L1 (-90, 158) -> (-90, 168)
  line L2 (-90, 168) -> (-100, 168)
  line L3 (-100, 168) -> (-100, 158)
  line L4 (-90, 168) -> (-100, 168)
  line L5 (-90, 158) -> (-90, 168)
  line L6 (-100, 168) -> (-100, 158)
  line L7 (-100, 158) -> (-90, 158)
  line L8 (-10, 168) -> (0, 168)
  line L9 (0, 168) -> (0, 178)
  line L10 (0, 178) -> (-10, 178)
  line L11 (-10, 178) -> (-10, 168)
  line L12 (-10, 178) -> (-10, 168)
  line L13 (0, 178) -> (-10, 178)
  line L14 (0, 168) -> (0, 178)
  line L15 (-10, 168) -> (0, 168)
  point P0 (0, 0)
extrude "Extrusion12" cut sketch "Sketch13" against normal blind 10
sketch "Sketch14" plane through (0, 10, 0) normal (0, 1, 0) x (1, 0, 0)
  line L0 (-10, 158) -> (0, 158)
  line L1 (0, 158) -> (0, 168)
  line L2 (0, 168) -> (-10, 168)
  line L3 (-10, 168) -> (-10, 158)
  line L4 (-10, 178) -> (0, 178)
  line L5 (-10, 128) -> (-10, 178)
  line L6 (-90, 168) -> (-54, 168)
  line L7 (0, 128) -> (0, 178)
  line L8 (-100, 168) -> (-90, 168)
  line L9 (-90, 168) -> (-90, 178)
  line L10 (-90, 178) -> (-100, 178)
  line L11 (-100, 178) -> (-100, 168)
  line L12 (-44, 178) -> (-100, 178)
  line L13 (-100, 178) -> (-100, 128)
  line L14 (-90, 128) -> (-90, 168)
  line L15 (-54, 158) -> (-44, 158)
  point P0 (0, 0)
  dimension "d192" = 10
  dimension "d193" = 10
  dimension "d194" = 10
extrude "Extrusion13" add sketch "Sketch14" along normal blind 10 contours L3 L2 L1 L0 | L11 L10 L9 L8
hole "Hole8" at (-5, 15, -168) direction (0, 0, 1) diameter 4.3 depth 10 tip angle 118
hole "Hole9" at (-100, 15, -173) direction (1, 0, 0) diameter 4.3 depth 10 tip angle 118
equation "\"d3\" = thickness"
equation "\"d4\" = thickness"
equation "\"d8\" = thickness"
equation "\"d10\" = thickness"
equation "\"d11\" = thickness"
equation "\"d27\" = thickness"
equation "\"d33\" = thickness"
equation "\"d34\" = thickness"
equation "\"d36\" = thickness"
equation "\"d38\" = thickness"
equation "\"d39\" = suspensionWidth"
equation "\"d40\" = suspensionWidth"
equation "\"d42\" = thickness"
equation "\"d44\" = thickness"
equation "\"d50\" = thickness"
equation "\"d51\" = thickness"
equation "\"d52\" = thickness"
equation "\"d53\" = thickness"
equation "\"d58\" = thickness"
equation "\"d64\" = thickness"
equation "\"d65\" = thickness"
equation "\"d148\" = thickness"
equation "\"d149\" = thickness"
equation "\"d150\" = thickness"
equation "\"d151\" = thickness"
equation "\"d66\" = thickness"
equation "\"d73\" = thickness"
equation "\"d77\" = 0.5 * motor"
equation "\"d159\" = thickness"
equation "\"d168\" = thickness"
properties part number "sideFrame2" material "ABS Plastic"
